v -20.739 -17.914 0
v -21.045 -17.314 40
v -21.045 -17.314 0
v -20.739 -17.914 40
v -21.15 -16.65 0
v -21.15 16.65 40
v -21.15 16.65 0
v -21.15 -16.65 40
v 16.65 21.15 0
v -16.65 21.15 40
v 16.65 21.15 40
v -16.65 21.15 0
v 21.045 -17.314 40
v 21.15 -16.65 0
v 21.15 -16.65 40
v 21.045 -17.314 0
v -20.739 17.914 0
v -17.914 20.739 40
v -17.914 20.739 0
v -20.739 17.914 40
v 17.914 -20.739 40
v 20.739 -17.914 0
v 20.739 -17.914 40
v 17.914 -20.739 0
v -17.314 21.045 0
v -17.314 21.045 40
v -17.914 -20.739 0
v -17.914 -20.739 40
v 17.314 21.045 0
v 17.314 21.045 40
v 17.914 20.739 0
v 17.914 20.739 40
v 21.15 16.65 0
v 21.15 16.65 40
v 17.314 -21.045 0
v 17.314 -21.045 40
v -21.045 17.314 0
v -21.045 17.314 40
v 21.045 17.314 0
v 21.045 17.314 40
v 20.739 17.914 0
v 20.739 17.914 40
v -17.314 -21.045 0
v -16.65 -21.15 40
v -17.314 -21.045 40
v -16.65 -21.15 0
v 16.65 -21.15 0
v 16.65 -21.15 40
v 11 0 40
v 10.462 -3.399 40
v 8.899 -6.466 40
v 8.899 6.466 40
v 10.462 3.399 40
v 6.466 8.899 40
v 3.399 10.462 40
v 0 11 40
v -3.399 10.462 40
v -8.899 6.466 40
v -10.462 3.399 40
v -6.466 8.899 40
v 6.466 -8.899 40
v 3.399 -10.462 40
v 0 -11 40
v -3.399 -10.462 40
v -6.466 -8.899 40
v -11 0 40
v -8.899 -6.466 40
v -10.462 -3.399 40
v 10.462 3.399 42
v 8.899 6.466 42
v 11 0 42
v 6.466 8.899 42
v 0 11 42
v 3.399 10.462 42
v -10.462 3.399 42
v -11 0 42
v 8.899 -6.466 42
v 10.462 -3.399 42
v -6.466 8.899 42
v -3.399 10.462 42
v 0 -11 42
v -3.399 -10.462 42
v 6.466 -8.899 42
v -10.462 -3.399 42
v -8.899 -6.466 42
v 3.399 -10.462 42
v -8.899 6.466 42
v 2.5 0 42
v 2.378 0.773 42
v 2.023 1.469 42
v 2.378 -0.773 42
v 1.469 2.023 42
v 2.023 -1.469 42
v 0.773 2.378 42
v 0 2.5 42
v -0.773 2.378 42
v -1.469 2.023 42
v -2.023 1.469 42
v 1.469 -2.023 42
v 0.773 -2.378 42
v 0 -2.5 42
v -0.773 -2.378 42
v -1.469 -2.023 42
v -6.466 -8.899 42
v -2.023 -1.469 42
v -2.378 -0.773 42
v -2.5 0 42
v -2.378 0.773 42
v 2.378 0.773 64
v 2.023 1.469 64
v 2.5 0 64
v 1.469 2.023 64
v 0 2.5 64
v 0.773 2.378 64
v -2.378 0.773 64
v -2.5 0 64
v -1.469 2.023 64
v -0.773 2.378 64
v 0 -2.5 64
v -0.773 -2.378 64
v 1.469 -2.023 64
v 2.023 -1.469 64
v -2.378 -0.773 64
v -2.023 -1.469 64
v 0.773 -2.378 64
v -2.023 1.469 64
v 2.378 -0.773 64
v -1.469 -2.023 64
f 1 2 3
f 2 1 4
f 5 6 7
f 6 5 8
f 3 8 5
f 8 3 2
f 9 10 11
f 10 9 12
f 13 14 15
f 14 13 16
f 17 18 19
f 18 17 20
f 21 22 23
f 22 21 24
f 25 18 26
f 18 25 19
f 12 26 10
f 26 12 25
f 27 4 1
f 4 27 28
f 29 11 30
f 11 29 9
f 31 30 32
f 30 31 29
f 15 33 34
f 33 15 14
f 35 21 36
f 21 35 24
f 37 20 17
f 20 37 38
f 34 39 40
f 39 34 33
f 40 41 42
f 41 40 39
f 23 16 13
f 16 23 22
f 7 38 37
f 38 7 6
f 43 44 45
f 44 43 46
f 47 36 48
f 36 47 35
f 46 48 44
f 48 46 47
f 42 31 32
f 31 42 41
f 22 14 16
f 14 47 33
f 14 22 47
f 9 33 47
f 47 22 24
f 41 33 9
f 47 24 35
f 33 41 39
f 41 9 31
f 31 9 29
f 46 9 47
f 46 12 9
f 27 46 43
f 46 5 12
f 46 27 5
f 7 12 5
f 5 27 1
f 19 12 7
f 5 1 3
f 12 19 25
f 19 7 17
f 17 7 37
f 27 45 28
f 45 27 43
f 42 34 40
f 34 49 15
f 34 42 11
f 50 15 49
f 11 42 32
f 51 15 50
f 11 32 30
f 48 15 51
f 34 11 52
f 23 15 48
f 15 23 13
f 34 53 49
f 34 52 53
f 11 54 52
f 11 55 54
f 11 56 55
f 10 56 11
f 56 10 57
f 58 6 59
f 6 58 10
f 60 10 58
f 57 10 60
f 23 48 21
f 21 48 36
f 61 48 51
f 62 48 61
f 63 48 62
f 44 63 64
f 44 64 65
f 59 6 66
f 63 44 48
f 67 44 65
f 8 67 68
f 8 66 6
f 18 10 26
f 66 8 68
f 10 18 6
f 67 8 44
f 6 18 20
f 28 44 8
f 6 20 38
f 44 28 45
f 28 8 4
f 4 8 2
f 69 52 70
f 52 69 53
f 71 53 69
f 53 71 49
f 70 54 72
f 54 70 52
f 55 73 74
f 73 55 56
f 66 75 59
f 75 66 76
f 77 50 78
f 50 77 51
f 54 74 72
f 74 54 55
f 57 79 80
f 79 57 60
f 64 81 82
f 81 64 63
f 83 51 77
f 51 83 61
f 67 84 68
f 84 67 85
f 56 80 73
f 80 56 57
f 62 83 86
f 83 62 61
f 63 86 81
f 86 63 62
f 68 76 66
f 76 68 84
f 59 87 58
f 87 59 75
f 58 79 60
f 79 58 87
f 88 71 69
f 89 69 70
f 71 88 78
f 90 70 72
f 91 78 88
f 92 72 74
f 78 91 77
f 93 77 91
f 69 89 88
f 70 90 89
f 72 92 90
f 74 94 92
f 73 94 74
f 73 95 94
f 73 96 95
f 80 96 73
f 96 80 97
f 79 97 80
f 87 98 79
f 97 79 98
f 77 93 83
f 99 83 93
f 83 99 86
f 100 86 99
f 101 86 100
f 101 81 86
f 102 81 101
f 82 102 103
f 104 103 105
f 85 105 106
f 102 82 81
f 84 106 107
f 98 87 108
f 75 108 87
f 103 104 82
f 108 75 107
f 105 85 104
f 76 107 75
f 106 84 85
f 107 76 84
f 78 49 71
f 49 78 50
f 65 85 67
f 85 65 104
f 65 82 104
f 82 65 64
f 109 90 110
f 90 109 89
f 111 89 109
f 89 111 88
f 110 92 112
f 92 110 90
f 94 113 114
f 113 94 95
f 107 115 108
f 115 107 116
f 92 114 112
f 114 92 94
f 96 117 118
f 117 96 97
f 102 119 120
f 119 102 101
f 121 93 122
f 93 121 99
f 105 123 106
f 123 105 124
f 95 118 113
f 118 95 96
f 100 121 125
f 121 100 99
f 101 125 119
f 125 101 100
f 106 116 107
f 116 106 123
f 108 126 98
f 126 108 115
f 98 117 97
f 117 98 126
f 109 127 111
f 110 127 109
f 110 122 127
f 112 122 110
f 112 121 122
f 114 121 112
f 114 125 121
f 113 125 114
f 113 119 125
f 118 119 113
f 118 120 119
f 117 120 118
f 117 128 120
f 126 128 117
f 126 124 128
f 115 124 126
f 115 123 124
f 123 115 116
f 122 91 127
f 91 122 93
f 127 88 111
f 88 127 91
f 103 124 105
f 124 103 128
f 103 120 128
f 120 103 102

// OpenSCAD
$fn = 20;
tailleMoteur = 40;
tailleExtremite = 10;

moteur();

module moteur() {
	color([0.8, 0.8, 0.8]) corps(tailleExtremite);
	color([0, 0, 0]) translate([0, 0, tailleExtremite]) corps(tailleMoteur - 2 * tailleExtremite);
	color([0.8, 0.8, 0.8]) translate([0, 0, tailleMoteur - tailleExtremite]) corps(tailleExtremite);
	color([0.8, 0.8, 0.8]) translate([0, 0, tailleMoteur]) cylinder(h = 2, r = 11);
	color([0.8, 0.8, 0.8]) translate([0, 0, tailleMoteur]) cylinder(h = 24, r = 2.5);
}

module corps(hauteur) {
	linear_extrude(height = hauteur, convexity = 10)
	hull() {
		for (i = [0:3]) {
			rotate(i * 90) {
				translate([19, 16.65, 0]) circle(2.15);
				translate([16.65, 19, 0]) circle(2.15);
			}
		}
	}
}
